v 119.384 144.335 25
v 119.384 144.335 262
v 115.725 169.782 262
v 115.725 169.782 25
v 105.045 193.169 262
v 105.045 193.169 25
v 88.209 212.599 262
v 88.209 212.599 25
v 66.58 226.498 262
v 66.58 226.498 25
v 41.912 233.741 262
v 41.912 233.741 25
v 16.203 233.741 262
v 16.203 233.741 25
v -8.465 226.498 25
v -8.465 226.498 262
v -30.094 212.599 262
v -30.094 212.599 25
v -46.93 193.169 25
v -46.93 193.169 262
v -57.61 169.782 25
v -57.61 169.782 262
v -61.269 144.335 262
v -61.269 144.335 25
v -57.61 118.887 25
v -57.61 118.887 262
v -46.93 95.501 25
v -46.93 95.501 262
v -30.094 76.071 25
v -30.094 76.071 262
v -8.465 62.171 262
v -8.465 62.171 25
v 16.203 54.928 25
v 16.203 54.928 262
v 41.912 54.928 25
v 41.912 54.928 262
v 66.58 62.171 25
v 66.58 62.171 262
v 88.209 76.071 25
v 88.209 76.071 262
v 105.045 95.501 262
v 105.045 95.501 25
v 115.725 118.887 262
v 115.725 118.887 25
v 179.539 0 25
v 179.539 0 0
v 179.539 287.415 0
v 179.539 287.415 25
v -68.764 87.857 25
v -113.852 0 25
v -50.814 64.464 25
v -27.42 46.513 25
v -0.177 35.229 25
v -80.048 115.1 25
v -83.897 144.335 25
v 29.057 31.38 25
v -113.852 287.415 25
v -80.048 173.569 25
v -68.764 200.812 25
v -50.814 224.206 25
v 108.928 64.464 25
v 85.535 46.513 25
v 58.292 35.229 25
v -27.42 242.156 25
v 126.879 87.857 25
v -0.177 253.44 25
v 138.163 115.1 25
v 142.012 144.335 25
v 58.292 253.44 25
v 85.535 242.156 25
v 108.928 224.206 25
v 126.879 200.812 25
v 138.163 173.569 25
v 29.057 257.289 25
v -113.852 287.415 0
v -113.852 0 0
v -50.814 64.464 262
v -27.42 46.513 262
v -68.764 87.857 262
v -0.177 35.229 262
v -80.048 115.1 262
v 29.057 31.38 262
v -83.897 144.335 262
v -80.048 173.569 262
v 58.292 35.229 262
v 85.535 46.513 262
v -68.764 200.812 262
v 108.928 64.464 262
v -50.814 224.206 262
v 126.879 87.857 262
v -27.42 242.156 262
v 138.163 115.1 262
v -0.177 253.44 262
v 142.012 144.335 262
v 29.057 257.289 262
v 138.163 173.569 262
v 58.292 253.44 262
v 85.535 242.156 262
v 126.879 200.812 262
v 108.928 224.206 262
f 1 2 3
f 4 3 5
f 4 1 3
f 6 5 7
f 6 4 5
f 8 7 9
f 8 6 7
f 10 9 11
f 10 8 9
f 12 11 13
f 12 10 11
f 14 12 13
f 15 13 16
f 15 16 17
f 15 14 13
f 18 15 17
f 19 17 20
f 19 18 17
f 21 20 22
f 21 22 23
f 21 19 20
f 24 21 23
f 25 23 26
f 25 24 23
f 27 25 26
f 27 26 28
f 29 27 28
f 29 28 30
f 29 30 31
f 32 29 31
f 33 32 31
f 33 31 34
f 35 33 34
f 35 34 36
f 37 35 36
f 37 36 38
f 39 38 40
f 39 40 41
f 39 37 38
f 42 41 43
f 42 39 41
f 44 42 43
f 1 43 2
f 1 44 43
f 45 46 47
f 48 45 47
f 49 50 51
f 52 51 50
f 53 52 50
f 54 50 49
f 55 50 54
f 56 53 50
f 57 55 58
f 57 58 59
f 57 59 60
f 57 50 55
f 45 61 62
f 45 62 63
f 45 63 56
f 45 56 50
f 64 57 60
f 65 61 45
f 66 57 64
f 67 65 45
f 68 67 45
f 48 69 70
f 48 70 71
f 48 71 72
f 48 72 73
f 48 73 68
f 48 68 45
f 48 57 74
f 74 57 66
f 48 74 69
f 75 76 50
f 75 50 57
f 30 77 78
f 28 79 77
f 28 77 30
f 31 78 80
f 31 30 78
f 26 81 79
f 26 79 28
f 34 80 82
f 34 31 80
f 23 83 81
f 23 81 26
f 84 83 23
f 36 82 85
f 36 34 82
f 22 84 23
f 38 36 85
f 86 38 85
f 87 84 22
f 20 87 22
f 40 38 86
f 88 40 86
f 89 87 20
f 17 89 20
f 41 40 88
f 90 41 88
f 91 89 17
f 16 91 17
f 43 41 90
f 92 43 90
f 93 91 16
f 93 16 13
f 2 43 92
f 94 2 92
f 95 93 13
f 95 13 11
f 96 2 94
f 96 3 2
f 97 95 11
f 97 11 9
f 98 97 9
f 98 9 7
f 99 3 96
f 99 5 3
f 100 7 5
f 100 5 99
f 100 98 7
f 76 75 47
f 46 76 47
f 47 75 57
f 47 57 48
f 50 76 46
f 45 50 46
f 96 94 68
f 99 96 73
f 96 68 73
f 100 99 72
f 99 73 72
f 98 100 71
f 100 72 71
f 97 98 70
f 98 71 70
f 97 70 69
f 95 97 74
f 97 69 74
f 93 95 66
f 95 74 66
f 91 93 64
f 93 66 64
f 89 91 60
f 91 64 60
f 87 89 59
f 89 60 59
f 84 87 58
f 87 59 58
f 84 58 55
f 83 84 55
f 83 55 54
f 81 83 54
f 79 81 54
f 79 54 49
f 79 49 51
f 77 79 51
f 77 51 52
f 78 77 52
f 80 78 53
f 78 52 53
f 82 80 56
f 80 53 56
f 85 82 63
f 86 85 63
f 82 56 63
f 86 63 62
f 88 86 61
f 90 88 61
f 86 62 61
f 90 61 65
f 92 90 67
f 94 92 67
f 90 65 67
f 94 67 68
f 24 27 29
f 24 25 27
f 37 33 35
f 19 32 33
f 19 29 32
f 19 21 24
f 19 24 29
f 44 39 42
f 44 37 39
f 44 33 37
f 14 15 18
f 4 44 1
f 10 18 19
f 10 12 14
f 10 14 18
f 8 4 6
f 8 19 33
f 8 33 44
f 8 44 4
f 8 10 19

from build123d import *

# Parameters (mm, degrees)
F0_R        = 112.954685
F0_R_2      = 90.326171
F1_DEPTH    = 175
F1_FACE_R   = 112.954685
F1_FACE_R_2 = 90.326171
F2_DEPTH    = 87
F3_W        = 293.390907
F3_H        = 287.415445
F4_DEPTH    = 25


with BuildPart() as f1:
    # F0 (on Top) → F1 (new body)
    with BuildSketch(Plane.XY):
        with Locations((29.057469, 144.334614)):
            Circle(F0_R)
        with Locations((29.057469, 144.334614)):
            Circle(F0_R_2, mode=Mode.SUBTRACT)
    extrude(amount=F1_DEPTH)

    # F1_face (on face) → F2 (join)
    with BuildSketch(Plane(origin=(29.057469, 144.334614, 175), x_dir=(1, 0, 0), z_dir=(0, 0, 1))):
        Circle(F1_FACE_R)
        Circle(F1_FACE_R_2, mode=Mode.SUBTRACT)
    extrude(amount=F2_DEPTH)

    # F3 (on Top) → F4 (join)
    with BuildSketch(Plane.XY):
        with Locations((32.84381, 143.707722)):
            Rectangle(F3_W, F3_H)
    extrude(amount=F4_DEPTH)


solid = f1.part
